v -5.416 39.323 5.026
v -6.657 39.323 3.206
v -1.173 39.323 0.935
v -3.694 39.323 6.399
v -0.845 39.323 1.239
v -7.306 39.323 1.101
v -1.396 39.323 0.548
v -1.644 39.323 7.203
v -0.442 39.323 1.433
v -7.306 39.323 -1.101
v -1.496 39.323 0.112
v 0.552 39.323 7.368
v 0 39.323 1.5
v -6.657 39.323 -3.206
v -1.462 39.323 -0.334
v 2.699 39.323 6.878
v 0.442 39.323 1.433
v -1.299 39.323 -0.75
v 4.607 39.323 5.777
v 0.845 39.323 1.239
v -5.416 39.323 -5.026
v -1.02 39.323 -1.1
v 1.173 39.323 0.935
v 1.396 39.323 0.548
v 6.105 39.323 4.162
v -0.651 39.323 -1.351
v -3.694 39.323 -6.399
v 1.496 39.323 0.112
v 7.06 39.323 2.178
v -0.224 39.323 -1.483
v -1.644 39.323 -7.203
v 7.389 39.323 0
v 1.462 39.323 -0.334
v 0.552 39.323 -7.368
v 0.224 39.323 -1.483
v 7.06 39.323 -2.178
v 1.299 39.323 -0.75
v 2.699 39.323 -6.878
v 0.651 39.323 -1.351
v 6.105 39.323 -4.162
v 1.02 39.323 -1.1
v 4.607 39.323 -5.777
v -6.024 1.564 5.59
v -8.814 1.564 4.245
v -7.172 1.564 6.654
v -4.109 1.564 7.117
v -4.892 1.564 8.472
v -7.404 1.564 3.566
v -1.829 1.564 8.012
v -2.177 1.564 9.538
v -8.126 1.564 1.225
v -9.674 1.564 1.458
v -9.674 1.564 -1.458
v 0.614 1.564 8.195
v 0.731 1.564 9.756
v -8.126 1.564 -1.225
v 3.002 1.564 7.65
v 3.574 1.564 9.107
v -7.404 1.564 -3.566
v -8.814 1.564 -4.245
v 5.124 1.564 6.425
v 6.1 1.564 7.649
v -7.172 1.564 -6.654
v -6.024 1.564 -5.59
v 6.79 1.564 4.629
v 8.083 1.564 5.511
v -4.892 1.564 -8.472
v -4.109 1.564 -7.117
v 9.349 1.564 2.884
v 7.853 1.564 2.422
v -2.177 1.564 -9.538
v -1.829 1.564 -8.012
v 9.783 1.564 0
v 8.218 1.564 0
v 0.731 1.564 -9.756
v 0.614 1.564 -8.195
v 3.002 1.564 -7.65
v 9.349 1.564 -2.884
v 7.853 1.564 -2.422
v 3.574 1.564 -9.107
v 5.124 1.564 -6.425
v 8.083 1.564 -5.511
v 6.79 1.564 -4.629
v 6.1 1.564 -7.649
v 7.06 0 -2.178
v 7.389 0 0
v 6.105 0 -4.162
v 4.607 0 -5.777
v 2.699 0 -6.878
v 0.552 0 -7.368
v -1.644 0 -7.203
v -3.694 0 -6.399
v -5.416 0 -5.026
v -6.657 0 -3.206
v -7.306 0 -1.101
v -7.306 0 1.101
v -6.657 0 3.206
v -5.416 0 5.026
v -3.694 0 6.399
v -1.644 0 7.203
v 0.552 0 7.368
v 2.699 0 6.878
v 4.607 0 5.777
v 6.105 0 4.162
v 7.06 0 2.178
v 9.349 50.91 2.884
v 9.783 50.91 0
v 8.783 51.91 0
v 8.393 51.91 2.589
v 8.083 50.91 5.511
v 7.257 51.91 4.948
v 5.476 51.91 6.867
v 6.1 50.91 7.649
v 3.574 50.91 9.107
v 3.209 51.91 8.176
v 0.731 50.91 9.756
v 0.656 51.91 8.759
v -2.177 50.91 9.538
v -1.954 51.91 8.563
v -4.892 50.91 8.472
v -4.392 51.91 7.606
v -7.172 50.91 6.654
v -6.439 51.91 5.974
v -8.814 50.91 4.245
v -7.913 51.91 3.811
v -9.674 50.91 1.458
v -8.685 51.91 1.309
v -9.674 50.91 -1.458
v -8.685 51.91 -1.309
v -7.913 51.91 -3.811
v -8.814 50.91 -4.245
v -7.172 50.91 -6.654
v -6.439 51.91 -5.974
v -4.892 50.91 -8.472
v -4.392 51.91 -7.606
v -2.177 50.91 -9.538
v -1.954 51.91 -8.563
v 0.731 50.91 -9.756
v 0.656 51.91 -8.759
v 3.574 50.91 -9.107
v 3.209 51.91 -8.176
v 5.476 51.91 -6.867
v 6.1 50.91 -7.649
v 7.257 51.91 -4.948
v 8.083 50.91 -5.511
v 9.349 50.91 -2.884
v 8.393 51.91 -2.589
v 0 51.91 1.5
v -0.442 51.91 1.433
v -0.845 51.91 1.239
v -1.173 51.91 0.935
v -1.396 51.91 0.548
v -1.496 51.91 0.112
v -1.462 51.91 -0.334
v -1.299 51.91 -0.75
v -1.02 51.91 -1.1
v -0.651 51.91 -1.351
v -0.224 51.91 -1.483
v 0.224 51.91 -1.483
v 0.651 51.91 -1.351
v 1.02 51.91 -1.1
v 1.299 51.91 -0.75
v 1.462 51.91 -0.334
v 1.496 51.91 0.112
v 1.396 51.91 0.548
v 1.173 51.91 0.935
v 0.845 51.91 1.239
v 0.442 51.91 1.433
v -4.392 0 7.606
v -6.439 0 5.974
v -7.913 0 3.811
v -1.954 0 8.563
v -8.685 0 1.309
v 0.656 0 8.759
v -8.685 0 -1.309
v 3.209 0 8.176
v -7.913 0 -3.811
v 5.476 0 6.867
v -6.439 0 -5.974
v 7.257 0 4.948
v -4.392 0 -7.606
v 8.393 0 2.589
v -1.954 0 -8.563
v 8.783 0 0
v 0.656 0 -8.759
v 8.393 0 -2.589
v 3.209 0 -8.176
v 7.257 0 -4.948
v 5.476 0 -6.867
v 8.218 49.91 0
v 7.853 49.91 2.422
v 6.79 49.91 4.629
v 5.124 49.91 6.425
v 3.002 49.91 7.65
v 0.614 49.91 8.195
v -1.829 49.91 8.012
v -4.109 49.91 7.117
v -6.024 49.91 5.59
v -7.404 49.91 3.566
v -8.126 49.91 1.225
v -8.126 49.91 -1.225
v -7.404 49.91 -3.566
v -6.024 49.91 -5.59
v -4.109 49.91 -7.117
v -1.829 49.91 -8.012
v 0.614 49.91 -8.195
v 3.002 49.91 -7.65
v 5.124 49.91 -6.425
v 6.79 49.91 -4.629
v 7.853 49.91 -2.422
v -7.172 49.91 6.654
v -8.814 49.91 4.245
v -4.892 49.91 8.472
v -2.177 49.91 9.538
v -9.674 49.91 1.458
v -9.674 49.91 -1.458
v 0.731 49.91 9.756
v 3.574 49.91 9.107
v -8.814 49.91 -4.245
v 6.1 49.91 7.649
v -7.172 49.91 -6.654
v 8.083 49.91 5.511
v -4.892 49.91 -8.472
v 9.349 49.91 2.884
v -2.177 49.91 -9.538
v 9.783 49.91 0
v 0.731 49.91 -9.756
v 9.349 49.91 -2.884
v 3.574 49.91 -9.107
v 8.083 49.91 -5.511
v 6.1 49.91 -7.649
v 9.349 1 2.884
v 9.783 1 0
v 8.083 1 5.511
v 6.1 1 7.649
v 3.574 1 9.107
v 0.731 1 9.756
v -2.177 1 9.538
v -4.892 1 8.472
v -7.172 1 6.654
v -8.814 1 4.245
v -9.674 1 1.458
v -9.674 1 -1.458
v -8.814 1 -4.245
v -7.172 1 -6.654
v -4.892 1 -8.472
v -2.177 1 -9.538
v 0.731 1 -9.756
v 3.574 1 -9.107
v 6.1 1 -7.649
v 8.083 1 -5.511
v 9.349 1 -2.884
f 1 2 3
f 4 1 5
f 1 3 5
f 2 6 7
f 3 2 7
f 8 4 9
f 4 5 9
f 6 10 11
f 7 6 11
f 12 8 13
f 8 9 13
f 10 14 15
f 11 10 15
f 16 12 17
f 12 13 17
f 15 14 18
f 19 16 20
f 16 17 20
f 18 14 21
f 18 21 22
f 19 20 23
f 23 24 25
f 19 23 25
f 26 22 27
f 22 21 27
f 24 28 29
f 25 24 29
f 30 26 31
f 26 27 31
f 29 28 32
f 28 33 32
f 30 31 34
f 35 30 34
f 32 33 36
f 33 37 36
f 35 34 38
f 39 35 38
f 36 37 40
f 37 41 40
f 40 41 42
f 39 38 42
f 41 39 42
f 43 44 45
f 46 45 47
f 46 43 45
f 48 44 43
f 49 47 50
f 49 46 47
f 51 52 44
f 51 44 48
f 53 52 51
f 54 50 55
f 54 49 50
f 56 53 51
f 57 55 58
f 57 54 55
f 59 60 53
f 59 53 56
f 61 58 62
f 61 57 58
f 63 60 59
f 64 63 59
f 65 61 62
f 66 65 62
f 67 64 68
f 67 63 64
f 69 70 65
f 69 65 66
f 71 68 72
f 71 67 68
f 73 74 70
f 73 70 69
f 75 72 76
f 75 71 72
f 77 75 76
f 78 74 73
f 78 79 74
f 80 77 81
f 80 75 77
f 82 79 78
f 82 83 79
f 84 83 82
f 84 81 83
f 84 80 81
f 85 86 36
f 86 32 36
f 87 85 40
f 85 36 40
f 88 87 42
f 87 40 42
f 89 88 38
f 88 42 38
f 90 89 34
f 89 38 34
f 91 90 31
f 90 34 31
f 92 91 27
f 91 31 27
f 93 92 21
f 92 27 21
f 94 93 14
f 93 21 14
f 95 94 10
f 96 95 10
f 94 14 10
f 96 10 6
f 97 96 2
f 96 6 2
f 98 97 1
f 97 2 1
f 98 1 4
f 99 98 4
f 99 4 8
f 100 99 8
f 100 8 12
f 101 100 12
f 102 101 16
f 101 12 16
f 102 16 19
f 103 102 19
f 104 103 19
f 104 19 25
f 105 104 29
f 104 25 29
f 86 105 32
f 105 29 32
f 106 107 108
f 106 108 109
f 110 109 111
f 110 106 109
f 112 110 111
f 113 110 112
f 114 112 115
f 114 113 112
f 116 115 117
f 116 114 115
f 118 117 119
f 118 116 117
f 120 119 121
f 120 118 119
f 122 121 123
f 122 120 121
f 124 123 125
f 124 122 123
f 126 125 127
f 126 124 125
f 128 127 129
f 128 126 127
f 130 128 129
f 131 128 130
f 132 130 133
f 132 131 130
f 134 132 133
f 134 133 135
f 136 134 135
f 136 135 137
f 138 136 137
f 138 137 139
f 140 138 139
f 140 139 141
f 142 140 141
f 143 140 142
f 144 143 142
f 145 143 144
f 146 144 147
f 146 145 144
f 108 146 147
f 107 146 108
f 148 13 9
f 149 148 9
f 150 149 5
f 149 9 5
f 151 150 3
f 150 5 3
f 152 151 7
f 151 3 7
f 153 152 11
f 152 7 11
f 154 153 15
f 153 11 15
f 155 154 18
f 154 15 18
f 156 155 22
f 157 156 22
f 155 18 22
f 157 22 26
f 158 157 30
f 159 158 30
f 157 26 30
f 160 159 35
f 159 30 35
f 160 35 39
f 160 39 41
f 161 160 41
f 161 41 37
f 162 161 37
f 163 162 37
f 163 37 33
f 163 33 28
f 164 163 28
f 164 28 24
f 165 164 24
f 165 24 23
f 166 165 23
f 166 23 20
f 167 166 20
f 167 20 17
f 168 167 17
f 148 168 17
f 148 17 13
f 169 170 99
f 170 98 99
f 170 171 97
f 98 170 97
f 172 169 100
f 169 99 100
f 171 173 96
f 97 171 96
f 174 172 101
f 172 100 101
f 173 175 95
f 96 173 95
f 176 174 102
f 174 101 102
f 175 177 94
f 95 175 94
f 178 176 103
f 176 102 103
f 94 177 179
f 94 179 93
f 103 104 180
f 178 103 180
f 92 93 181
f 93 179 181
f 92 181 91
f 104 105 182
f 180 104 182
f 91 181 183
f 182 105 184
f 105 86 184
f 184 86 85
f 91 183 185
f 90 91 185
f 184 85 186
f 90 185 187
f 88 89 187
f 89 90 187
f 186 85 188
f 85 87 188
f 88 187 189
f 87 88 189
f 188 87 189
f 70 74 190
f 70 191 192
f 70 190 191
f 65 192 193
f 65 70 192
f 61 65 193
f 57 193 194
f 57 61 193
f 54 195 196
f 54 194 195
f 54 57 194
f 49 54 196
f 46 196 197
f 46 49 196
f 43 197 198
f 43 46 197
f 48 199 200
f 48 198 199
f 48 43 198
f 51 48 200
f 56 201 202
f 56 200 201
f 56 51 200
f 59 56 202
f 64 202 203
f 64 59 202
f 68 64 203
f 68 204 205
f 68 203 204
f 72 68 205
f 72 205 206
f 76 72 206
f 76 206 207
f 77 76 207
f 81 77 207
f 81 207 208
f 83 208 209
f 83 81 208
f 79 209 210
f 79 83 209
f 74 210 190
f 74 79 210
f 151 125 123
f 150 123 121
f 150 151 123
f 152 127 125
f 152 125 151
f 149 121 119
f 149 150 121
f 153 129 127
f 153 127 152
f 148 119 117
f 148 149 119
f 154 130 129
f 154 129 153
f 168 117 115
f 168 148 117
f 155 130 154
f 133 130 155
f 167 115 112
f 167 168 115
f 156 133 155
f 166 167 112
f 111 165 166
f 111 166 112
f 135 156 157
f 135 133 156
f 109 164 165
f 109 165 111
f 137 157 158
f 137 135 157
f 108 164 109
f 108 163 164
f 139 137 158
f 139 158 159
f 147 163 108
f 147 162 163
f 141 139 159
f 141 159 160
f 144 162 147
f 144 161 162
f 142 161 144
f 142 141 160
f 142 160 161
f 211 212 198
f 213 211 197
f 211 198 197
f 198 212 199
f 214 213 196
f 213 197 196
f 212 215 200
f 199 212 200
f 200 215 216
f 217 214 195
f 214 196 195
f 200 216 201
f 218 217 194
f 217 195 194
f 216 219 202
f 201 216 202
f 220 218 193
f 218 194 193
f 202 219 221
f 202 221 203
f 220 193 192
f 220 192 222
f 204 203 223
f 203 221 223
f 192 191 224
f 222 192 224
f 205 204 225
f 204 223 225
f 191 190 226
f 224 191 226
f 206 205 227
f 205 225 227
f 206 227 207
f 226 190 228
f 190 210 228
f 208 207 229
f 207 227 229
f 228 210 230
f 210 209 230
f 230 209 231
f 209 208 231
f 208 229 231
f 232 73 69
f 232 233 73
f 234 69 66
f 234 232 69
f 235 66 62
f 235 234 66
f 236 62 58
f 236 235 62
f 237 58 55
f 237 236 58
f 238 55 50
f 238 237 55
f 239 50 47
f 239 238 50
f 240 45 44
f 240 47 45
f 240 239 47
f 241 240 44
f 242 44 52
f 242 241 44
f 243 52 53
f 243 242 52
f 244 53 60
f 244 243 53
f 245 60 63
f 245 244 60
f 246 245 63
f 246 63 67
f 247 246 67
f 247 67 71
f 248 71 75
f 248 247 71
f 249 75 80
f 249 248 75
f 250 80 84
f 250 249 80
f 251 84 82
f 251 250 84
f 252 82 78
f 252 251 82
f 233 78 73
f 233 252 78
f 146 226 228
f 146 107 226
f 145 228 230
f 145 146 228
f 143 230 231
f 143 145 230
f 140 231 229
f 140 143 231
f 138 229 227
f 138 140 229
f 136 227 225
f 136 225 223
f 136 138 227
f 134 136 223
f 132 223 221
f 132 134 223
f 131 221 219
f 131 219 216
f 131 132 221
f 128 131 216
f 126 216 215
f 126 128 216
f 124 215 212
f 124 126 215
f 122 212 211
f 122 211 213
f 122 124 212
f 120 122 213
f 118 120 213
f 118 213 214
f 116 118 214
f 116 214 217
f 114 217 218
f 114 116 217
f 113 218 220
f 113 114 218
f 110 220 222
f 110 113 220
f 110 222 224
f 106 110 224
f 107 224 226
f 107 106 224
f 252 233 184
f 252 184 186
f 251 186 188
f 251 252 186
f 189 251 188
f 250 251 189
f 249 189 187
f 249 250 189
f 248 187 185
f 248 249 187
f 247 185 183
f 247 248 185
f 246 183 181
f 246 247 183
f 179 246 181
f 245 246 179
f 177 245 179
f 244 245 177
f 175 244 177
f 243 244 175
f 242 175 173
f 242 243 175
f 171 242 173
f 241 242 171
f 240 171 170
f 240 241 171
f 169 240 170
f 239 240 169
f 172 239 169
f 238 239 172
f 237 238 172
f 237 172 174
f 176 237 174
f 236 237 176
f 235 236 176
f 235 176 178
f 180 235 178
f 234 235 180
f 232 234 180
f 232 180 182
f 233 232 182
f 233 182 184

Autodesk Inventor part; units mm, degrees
ref_plane "YZ Plane" through (0, 0, 0) normal (1, 0, 0) x (0, 1, 0)
ref_plane "XZ Plane" through (0, 0, 0) normal (0, 1, 0) x (-1, 0, 0)
ref_plane "XY Plane" through (0, 0, 0) normal (0, 0, 1) x (1, 0, 0)
sketch "Esboço1" plane through (0, 0, 0) normal (0, 0, 1) x (1, 0, 0)
  line L0 (0, 0) -> (0, 57)
  line L1 (8.2179, 1.5639) -> (9.7832, 1.5639)
  line L2 (9.7832, 1.5639) -> (9.7832, 0)
  line L3 (7.3887, 0.7346) -> (7.3887, 39.3227)
  line L4 (7.3887, 0.7346) -> (7.3887, 0)
  line L5 (7.3887, 0) -> (9.7832, 0)
  line L6 (9.7832, 0) -> (7.3887, 0)
  line L7 (0.8292, 0) -> (0, 0)
  line L8 (0, 42.2247) -> (0, 57)
  line L9 (0, 42.2247) -> (0, 39.7247)
  line L10 (0, 55.3122) -> (0, 52.8122)
  line L11 (8.2179, 49.9102) -> (8.2179, 1.5639)
  line L12 (0, 42.2247) -> (0, 39.3227)
  line L13 (0, 39.3227) -> (7.3887, 39.3227)
  line L14 (0, 52.8122) -> (0, 49.9102)
  line L15 (8.2179, 49.9102) -> (9.7832, 49.9102)
  line L16 (9.7832, 49.9102) -> (9.7832, 51.9102)
  line L17 (9.7832, 51.9102) -> (0, 51.9102)
revolve "Revolução1" add sketch "Esboço1" angle 360 about axis through (0, 0, 0) along (0, 1, 0)
chamfer "Chanfro2" distance 1 angle 45 1 edges at (-9.7832, 0, 0)
chamfer "Chanfro4" distance 1 angle 45 1 edges at (-9.7832, 51.9102, 0)
sketch "Esboço4" plane through (0, 51.9102, 0) normal (0, 1, 0) x (1, 0, 0)
  circle A0 centre (0, 0) radius 8.7832 projected
hole "Furo2" at (0, 51.9102, 0) direction (0, -1, 0) diameter 3 depth 19.499 tip angle 118
properties part number "roda"
